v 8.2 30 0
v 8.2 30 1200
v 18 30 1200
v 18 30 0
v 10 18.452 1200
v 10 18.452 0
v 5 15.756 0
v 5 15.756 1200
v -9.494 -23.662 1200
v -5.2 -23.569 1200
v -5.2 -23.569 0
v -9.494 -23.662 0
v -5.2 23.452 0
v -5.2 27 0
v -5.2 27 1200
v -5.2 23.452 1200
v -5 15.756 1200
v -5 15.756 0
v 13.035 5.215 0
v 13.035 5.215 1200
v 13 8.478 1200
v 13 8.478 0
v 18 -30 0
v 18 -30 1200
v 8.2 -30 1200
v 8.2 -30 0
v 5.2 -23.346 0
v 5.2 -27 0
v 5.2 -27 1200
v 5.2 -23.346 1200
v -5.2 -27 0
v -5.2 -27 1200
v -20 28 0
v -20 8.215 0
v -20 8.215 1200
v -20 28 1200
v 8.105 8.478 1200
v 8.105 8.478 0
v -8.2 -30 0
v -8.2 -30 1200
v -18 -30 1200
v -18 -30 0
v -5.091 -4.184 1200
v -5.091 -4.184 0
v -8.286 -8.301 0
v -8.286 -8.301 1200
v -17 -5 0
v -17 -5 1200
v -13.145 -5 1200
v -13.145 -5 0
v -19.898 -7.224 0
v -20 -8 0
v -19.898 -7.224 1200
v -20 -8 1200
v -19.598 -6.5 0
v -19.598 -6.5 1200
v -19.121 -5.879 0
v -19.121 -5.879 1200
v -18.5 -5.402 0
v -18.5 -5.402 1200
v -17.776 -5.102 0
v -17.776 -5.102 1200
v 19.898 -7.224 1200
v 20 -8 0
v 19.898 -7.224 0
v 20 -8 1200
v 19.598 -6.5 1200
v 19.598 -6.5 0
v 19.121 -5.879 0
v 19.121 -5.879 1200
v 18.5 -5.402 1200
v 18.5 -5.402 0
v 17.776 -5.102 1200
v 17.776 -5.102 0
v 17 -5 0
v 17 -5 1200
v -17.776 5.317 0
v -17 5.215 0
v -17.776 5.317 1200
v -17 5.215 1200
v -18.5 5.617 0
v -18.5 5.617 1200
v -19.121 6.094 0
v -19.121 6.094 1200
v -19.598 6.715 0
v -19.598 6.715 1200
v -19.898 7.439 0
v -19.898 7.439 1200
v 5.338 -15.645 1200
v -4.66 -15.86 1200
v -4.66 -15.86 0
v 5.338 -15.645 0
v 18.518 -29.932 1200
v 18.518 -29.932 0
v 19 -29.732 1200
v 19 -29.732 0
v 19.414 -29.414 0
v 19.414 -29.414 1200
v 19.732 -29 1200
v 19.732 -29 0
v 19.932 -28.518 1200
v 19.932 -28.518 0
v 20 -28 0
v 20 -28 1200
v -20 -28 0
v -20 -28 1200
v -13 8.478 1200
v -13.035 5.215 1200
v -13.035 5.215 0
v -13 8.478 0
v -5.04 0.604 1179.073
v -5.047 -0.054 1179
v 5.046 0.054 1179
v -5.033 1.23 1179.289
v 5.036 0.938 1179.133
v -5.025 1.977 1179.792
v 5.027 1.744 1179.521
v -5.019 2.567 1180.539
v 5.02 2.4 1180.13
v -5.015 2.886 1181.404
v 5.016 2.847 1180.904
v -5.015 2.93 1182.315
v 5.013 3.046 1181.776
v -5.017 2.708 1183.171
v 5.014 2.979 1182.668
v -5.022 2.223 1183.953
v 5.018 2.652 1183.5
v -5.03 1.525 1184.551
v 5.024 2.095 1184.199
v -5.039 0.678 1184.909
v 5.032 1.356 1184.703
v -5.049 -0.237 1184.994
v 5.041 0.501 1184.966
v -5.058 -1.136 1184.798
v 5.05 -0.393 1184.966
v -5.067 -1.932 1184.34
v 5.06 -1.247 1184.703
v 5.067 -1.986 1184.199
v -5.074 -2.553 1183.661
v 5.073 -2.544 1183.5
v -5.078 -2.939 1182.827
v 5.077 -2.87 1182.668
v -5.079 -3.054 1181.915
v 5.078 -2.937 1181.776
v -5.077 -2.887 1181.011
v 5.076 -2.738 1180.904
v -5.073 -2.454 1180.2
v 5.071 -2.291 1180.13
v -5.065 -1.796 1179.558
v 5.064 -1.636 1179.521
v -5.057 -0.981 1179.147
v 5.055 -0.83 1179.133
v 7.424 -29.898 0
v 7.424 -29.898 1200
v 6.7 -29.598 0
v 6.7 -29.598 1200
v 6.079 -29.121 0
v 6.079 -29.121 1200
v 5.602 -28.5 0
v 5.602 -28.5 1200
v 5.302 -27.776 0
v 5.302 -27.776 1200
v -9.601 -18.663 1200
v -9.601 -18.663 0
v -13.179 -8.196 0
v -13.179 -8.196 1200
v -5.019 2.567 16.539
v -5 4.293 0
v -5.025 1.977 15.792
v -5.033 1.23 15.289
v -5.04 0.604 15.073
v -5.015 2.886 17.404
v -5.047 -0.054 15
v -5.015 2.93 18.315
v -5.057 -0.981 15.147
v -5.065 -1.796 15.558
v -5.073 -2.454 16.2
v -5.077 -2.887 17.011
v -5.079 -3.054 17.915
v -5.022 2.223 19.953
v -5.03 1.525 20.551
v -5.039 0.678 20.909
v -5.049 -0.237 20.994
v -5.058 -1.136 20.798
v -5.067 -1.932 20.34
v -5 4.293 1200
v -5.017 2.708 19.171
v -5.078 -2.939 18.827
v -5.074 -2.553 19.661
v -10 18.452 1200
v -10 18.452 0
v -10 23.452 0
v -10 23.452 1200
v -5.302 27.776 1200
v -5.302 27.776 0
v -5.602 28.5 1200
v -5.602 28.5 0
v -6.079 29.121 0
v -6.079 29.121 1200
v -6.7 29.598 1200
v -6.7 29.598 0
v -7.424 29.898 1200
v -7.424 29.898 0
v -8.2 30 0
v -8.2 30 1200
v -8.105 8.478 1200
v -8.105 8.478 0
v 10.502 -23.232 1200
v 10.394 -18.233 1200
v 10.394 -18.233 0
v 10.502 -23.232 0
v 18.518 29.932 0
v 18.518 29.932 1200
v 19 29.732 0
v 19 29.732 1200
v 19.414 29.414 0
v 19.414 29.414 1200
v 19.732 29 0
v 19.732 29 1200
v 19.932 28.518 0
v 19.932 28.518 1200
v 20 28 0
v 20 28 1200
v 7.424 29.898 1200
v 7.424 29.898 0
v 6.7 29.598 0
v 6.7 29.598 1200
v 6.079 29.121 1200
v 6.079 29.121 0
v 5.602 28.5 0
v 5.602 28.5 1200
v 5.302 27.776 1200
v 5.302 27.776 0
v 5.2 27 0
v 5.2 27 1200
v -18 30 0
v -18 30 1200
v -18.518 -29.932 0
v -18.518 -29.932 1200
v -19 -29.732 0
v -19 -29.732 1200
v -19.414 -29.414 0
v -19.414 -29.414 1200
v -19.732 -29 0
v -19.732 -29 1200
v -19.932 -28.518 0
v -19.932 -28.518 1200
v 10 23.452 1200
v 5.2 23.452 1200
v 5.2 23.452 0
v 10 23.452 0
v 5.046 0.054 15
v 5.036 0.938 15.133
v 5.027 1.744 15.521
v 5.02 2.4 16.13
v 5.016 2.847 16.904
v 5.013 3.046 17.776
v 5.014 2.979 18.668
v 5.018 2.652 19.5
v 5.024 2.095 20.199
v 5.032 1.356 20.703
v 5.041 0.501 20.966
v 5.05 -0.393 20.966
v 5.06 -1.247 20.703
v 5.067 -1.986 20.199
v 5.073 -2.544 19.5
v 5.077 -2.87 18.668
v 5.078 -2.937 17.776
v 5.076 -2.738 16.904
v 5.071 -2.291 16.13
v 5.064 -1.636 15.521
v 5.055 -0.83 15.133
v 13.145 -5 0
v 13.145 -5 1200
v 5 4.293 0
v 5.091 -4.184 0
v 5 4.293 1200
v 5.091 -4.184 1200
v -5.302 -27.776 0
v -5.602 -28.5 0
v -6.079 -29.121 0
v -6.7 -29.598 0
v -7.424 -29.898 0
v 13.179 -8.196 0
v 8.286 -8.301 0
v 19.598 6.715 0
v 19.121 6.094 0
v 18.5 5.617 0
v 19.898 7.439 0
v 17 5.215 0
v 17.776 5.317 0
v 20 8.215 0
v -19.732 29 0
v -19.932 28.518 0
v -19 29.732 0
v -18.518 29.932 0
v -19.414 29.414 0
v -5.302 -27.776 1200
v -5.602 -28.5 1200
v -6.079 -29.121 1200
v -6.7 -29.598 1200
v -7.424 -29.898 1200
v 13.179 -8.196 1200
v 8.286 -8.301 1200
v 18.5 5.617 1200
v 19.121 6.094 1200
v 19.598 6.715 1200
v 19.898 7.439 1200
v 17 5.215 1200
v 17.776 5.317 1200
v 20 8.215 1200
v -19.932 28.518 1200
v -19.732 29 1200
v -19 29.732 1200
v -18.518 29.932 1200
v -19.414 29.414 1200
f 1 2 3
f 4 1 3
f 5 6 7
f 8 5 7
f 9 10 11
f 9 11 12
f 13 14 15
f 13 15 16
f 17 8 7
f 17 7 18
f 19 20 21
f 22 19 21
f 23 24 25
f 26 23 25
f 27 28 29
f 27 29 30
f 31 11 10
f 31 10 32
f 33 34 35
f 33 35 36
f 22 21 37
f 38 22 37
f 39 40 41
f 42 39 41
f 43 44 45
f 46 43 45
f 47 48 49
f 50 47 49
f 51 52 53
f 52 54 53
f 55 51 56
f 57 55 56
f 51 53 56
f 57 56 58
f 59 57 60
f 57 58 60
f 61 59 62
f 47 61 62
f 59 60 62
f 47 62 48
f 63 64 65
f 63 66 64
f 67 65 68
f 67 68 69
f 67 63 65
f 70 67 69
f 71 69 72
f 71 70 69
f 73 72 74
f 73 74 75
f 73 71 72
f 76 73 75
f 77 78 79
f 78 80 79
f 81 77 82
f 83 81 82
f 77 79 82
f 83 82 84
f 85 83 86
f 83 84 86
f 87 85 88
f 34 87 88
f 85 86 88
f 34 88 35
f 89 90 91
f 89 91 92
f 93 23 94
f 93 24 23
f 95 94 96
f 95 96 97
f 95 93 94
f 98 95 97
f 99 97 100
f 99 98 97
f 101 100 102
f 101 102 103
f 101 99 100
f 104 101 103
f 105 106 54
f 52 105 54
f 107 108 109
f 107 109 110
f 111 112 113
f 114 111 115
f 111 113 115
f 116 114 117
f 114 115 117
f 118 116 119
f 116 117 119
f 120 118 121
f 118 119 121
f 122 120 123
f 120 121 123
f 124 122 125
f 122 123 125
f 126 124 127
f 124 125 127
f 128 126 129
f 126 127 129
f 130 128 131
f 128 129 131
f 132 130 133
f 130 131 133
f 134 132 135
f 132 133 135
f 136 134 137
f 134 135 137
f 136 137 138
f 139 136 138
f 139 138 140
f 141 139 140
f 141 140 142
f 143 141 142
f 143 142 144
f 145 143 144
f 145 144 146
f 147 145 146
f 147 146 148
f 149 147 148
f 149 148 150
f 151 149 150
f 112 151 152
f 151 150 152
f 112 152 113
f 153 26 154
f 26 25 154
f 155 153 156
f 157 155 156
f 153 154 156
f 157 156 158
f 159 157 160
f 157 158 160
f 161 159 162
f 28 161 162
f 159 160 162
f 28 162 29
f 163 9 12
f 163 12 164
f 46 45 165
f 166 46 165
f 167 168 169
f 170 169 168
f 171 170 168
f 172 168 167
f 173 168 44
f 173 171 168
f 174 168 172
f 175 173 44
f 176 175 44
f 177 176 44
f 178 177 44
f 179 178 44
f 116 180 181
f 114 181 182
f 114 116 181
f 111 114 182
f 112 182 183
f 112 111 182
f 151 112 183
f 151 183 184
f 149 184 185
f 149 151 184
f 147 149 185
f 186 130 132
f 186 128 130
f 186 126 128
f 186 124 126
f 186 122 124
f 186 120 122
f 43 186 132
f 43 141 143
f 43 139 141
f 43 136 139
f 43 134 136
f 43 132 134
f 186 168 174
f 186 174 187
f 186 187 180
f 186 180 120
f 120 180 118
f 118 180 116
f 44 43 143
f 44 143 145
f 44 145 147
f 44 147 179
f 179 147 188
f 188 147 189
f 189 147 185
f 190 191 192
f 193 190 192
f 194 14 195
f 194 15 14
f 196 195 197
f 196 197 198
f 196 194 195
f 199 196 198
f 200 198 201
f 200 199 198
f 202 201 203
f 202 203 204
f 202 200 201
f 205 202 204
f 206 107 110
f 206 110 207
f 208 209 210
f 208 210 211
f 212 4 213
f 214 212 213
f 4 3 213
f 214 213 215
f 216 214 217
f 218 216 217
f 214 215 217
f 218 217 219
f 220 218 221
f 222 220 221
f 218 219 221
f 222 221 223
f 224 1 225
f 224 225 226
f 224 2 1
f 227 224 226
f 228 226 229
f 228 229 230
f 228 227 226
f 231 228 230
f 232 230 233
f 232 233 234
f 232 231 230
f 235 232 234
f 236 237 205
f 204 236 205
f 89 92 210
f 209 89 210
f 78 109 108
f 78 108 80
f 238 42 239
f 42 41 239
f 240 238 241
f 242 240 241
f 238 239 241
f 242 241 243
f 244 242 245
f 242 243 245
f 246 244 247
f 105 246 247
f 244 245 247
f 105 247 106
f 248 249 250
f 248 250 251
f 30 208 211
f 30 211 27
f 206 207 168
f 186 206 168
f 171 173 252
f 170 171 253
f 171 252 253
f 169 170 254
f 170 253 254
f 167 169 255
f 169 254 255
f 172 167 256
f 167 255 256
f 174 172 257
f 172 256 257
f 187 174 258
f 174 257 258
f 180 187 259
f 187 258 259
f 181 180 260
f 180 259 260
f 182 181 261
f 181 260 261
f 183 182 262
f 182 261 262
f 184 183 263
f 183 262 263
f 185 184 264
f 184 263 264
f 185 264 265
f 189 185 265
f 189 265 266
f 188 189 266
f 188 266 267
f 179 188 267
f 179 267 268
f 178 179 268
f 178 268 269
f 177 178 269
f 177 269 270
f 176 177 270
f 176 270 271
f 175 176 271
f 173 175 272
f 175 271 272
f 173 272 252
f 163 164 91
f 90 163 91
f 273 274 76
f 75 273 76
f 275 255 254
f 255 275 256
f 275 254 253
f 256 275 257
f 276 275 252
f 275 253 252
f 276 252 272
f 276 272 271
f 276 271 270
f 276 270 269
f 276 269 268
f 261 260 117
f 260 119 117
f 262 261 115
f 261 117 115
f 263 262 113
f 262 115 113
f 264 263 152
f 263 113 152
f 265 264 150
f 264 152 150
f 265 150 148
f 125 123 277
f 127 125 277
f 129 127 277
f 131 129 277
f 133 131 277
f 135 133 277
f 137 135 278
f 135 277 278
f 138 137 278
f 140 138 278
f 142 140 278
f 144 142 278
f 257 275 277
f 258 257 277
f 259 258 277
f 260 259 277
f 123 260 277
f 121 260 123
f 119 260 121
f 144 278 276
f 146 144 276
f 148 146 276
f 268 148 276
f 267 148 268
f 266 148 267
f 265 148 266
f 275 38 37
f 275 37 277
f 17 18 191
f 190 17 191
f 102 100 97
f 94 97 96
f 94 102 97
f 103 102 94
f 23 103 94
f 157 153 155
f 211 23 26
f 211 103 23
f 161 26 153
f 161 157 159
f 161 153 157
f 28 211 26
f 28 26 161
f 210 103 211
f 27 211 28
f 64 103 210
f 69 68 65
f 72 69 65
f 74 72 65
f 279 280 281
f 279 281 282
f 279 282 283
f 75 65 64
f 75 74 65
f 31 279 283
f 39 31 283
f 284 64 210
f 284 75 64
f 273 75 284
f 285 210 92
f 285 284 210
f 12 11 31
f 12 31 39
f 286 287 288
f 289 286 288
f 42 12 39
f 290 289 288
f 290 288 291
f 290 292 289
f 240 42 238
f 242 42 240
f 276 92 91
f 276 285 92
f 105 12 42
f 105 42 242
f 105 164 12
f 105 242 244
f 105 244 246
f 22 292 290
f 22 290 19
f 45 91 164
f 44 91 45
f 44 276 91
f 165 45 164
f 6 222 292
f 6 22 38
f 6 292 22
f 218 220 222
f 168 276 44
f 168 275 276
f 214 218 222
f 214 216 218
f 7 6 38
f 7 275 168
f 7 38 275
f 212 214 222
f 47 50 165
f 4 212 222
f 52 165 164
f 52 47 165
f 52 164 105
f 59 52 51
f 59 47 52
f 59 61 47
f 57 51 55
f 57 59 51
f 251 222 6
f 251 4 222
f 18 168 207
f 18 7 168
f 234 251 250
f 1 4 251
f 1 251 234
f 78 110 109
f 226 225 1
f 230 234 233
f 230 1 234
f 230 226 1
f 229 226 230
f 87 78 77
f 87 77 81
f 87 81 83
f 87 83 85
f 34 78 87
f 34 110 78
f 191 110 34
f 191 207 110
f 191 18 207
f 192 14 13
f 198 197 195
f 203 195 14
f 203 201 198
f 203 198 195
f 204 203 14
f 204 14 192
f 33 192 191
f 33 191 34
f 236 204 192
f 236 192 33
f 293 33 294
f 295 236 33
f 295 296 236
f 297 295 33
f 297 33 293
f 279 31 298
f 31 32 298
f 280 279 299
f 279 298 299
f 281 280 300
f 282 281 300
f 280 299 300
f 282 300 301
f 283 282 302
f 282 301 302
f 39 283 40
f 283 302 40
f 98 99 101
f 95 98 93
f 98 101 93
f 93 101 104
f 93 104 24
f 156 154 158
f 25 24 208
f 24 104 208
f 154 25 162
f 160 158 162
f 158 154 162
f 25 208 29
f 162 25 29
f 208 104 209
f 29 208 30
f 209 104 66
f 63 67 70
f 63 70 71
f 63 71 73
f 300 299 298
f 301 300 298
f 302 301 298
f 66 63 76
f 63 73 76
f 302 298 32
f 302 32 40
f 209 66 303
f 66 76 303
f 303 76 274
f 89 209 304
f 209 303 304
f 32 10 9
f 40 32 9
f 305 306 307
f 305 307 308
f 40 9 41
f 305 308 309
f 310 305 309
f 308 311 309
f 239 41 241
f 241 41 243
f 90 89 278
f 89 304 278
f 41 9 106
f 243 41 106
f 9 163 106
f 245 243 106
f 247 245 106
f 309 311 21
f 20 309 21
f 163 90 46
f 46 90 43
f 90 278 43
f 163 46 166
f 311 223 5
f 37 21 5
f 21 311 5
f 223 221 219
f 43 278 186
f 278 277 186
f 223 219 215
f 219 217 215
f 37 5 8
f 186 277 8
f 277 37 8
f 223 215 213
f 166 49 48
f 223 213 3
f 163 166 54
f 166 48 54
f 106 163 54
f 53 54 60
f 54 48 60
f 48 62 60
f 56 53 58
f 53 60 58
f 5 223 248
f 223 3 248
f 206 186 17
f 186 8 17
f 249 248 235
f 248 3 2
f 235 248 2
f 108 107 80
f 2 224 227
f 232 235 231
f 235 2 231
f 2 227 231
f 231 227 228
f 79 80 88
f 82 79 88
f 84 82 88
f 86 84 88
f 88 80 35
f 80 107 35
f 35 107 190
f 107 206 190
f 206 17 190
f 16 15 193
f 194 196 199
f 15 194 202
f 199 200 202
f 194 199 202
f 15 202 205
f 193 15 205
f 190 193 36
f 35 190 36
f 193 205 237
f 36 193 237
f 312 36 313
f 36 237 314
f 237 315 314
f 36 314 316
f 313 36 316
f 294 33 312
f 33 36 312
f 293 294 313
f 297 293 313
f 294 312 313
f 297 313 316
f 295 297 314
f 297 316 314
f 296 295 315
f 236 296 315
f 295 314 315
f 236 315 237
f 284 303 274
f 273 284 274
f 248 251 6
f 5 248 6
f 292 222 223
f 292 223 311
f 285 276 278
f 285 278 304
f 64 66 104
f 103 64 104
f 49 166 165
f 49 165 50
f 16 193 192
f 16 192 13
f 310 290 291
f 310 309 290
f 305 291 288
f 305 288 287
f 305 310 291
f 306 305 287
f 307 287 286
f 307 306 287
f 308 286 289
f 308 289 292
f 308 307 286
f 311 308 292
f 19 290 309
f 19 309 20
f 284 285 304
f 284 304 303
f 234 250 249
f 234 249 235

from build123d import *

# Parameters (mm, degrees)
SALIENTE_EXTRUIR1_DEPTH    = 1200
REDONDEO3_R                = 2
REDONDEO4_R                = 3
CORTAR_EXTRUIR1_DEPTH      = 1200
CROQUIS3_R                 = 3
CORTAR_EXTRUIR2_DEPTH      = 56
CORTAR_EXTRUIR2_DEPTH_BACK = 96


with BuildPart() as part:
    # Croquis1 → Saliente-Extruir1 (new body)
    with BuildSketch(Plane.XY):
        Polygon((20, -30), (5.2, -30), (5.2, -20), (-5.2, -20), (-5.2, -30), (-20, -30), (-20, -5), (-10, -5), (-10, 5.215), (-20, 5.215), (-20, 30), (-5.2, 30), (-5.2, 20), (5.2, 20), (5.2, 30), (20, 30), (20, 5.215), (10, 5.215), (10, -5), (20, -5), align=None)
    extrude(amount=SALIENTE_EXTRUIR1_DEPTH)

    # Redondeo3
    redondeo3_edges = [part.edges().sort_by_distance(p)[0] for p in [
        (-20, -30, 600),
        (-20, 30, 600),
        (20, 30, 600),
        (20, -30, 600),
    ]]
    fillet(redondeo3_edges, radius=REDONDEO3_R)

    # Redondeo4
    redondeo4_edges = [part.edges().sort_by_distance(p)[0] for p in [
        (-5.2, -30, 600),
        (-20, -5, 600),
        (-20, 5.215, 600),
        (-5.2, 30, 600),
        (5.2, 30, 600),
        (20, 5.215, 600),
        (20, -5, 600),
        (5.2, -30, 600),
    ]]
    fillet(redondeo4_edges, radius=REDONDEO4_R)

    # Croquis2 → Cortar-Extruir1 (cut)
    with BuildSketch(Plane.XY.offset(1200)):
        Polygon((-10, 23.452026666), (10, 23.452026666), (10, 18.452026666), (5, 15.75606021), (-5, 15.75606021), (-10, 18.452026666), align=None)
        Polygon((-9.601016284, -18.662737591), (-4.660128357, -15.859906589), (5.33756066, -15.644931432), (10.39436175, -18.232787277), (10.501849328, -23.231631786), (-9.493528706, -23.6615821), align=None)
        Polygon((13, 8.477670191), (8.105479793, 8.477670191), (5, 4.292585096), (5.091124424, -4.184105508), (8.285855478, -8.301463337), (13.17924457, -8.196243312), align=None)
        Polygon((-13, 8.477670191), (-8.105479793, 8.477670191), (-5, 4.292585096), (-5.091124424, -4.184105508), (-8.285855478, -8.301463337), (-13.17924457, -8.196243312), align=None)
    extrude(amount=-CORTAR_EXTRUIR1_DEPTH, mode=Mode.SUBTRACT)

    # Croquis3 → Cortar-Extruir2 (cut, two sides)
    with BuildSketch(Plane(origin=(5.045562212, 0.054239794, 0), x_dir=(0, 0, -1), z_dir=(0.999942224, 0.010749379, 0))) as cortar_extruir2_sk:
        with Locations((-1182, 0)):
            Circle(CROQUIS3_R)
        with Locations((-18, 0)):
            Circle(CROQUIS3_R)
    extrude(amount=CORTAR_EXTRUIR2_DEPTH, mode=Mode.SUBTRACT)
    extrude(cortar_extruir2_sk.sketch, amount=-CORTAR_EXTRUIR2_DEPTH_BACK, mode=Mode.SUBTRACT)


solid = part.part
